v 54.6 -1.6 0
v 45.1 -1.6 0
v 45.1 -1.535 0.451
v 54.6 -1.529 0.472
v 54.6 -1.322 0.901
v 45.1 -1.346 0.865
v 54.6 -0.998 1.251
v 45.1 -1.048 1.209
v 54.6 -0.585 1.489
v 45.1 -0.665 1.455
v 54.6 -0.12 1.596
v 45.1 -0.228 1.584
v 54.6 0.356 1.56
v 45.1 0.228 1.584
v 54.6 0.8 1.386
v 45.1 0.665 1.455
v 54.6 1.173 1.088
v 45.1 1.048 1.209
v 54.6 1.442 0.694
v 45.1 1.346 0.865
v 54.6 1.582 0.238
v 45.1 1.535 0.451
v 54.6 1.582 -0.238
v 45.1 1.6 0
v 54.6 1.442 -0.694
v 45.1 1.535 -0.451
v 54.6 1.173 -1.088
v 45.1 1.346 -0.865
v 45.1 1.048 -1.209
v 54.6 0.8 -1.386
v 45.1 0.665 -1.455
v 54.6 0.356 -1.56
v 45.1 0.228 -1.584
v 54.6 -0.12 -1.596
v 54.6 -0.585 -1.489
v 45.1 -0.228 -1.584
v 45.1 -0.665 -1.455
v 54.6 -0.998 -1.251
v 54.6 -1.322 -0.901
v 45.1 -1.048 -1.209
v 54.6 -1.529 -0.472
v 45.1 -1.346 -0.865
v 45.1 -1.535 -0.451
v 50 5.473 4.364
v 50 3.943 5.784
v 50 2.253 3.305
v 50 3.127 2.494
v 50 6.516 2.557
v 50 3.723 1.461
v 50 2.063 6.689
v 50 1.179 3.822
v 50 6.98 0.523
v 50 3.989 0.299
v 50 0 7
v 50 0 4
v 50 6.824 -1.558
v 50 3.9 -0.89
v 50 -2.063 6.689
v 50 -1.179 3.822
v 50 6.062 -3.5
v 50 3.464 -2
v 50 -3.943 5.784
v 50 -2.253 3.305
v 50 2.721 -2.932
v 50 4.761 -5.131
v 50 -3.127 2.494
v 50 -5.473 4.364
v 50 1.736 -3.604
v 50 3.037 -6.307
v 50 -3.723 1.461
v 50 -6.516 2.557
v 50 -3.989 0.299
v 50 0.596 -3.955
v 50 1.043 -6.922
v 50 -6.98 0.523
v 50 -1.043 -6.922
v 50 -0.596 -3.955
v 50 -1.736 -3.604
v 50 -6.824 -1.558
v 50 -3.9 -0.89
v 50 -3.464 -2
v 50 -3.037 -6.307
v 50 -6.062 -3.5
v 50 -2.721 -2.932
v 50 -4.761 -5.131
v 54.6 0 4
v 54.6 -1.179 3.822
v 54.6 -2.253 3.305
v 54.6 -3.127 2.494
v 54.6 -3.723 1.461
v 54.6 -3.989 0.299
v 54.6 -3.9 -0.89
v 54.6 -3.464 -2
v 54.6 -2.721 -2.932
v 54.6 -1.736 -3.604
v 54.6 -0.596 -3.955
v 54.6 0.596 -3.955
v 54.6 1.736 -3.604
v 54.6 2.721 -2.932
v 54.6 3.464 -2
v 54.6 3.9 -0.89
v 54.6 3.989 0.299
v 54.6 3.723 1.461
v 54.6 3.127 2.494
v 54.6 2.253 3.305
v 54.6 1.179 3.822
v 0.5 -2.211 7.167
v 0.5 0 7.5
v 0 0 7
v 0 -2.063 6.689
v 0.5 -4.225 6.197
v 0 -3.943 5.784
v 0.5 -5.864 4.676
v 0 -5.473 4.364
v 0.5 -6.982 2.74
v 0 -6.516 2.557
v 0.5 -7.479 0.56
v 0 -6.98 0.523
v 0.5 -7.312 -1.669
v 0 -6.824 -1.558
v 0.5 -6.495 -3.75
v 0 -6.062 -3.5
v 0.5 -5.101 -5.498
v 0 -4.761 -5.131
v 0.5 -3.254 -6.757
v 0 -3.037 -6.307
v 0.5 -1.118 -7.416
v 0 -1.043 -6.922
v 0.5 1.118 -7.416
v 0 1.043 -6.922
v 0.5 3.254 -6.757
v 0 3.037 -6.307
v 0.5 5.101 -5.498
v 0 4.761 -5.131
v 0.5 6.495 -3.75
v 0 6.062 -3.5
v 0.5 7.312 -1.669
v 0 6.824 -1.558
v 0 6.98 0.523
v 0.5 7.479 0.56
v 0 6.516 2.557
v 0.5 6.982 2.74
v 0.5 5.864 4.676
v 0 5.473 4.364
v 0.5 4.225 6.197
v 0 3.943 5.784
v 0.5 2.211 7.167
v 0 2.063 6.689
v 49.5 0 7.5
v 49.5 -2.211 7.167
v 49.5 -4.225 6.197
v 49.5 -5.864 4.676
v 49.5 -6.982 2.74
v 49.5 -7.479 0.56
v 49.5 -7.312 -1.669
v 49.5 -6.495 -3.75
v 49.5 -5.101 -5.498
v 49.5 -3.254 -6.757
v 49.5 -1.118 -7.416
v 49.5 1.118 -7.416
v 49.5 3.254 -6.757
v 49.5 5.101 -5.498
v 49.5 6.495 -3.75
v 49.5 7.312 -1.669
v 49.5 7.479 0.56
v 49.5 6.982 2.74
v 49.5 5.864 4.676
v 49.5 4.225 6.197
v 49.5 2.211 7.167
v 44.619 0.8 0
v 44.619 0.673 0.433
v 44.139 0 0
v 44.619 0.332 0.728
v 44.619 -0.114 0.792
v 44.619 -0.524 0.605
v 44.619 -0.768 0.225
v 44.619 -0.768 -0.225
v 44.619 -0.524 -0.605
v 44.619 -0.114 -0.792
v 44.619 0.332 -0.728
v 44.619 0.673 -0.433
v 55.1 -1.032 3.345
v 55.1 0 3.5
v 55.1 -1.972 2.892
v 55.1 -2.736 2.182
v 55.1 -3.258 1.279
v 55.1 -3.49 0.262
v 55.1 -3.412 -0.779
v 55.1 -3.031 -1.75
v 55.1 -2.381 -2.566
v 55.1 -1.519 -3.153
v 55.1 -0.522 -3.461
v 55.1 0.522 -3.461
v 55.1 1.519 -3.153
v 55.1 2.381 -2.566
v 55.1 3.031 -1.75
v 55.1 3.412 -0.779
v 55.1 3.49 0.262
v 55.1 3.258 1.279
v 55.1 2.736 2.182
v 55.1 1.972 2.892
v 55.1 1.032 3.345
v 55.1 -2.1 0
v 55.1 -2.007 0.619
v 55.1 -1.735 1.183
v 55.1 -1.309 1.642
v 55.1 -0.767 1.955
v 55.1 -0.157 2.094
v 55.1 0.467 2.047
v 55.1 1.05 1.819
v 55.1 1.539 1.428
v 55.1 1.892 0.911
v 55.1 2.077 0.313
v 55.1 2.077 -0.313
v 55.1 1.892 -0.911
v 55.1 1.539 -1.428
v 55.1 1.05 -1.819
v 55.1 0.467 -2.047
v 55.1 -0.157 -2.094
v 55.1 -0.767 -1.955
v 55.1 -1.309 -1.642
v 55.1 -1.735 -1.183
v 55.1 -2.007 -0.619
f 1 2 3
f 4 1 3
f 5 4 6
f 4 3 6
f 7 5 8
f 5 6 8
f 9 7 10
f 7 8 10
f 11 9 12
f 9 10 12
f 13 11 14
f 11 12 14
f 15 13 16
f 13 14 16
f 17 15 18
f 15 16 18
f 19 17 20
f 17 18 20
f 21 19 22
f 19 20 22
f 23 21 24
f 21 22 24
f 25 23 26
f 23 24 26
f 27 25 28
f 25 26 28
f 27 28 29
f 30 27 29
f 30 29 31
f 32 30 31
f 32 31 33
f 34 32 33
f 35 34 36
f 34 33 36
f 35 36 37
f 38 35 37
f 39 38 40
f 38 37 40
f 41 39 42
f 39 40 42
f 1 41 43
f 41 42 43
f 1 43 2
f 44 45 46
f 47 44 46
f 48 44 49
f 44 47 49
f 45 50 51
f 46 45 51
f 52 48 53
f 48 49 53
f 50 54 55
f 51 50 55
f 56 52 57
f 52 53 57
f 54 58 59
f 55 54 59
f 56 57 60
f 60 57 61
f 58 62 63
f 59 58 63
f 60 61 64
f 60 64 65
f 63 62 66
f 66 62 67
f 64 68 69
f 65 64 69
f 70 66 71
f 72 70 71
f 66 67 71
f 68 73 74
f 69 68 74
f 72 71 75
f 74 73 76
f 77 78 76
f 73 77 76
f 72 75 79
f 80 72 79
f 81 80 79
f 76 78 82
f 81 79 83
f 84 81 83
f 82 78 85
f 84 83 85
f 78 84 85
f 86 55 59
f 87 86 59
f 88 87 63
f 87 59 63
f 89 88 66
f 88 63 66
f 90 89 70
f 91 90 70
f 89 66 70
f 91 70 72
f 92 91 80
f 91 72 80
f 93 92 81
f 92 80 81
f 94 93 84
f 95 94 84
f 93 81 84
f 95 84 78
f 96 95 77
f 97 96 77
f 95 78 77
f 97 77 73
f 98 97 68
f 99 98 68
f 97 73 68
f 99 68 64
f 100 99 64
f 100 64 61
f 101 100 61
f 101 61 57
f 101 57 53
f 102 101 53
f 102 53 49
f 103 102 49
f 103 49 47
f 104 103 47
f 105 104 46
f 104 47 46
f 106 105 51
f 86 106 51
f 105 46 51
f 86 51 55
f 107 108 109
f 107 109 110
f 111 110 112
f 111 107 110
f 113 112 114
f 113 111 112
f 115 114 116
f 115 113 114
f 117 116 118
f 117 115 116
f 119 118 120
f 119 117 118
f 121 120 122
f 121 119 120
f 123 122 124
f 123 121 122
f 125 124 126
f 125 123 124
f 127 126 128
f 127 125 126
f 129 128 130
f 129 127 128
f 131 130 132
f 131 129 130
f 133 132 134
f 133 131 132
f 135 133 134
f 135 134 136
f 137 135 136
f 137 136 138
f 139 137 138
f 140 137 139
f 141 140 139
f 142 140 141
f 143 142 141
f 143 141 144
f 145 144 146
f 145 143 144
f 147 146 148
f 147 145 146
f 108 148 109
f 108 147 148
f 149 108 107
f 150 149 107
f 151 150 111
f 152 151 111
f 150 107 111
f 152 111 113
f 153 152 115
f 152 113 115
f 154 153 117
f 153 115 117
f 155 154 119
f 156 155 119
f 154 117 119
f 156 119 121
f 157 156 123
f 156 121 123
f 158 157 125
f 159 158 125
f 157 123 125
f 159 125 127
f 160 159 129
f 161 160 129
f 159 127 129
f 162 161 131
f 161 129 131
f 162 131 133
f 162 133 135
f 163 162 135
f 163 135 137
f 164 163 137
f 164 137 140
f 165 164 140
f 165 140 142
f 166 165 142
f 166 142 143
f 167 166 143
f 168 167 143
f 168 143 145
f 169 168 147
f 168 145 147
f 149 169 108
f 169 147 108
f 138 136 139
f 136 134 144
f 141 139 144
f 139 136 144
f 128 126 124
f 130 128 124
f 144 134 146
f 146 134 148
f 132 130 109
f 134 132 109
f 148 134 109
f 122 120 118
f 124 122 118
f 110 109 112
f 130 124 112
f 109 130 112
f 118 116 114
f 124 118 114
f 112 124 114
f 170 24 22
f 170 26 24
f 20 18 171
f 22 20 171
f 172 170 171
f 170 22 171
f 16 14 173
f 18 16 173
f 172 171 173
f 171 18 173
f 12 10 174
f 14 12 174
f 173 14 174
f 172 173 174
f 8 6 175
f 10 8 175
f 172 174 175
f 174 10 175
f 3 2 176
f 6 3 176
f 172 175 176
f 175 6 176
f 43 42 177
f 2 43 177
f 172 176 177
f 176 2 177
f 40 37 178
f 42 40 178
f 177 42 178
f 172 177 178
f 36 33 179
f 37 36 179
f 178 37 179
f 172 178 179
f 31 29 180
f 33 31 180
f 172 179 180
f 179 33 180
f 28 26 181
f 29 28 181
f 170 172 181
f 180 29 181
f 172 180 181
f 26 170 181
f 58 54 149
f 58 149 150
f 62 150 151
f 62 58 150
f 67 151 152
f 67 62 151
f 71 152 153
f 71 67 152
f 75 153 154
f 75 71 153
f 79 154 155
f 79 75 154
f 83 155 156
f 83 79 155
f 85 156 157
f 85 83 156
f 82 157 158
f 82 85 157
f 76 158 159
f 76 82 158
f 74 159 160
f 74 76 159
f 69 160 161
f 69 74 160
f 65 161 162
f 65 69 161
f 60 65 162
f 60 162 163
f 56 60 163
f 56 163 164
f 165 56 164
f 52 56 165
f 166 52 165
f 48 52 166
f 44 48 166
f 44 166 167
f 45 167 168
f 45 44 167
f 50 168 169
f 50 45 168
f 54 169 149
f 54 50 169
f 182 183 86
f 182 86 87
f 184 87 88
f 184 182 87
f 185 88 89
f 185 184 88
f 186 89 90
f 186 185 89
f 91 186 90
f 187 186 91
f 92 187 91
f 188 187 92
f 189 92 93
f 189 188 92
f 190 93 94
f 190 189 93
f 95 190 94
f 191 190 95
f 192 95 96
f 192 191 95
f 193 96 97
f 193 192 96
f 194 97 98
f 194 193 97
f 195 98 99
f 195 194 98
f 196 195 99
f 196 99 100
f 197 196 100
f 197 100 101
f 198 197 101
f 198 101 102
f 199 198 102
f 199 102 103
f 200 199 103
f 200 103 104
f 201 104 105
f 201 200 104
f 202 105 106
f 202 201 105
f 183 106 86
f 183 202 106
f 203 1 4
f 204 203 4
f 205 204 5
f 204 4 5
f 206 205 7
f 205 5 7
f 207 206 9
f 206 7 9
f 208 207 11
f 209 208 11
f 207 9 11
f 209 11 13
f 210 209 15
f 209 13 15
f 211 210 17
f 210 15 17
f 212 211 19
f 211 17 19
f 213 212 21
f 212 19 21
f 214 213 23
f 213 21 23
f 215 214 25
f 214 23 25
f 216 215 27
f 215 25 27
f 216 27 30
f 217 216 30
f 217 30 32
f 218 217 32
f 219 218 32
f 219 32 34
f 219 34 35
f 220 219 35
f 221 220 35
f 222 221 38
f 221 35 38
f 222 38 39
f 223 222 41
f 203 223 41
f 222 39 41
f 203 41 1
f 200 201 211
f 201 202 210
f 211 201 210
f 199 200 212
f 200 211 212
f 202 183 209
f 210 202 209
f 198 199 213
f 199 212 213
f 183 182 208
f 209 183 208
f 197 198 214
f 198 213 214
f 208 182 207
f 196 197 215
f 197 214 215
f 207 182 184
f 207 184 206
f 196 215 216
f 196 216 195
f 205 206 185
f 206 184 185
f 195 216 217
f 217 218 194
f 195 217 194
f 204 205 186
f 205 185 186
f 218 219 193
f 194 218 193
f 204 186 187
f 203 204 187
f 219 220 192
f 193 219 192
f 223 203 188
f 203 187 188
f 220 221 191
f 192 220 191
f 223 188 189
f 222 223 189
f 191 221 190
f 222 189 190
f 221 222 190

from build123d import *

# Parameters (mm, degrees)
F3_D     = 3.2
F3_DEPTH = 10
F3_TIP   = 0.9613769904
F4_SIZE  = 0.5


with BuildPart() as f1:
    # F0 (on Front) → F1 (revolve)
    with BuildSketch(Plane.XZ):
        Polygon((0, 7.5), (0, 0), (50, 0), (55.1, 0), (55.1, 4), (50, 4), (50, 7.5), align=None)
    revolve(axis=Axis((25, 0, 0), (1, 0, 0)))

    # F3
    with Locations(Plane.YZ.offset(55.1)):
        with Locations((0, 0)):
            Hole(F3_D / 2, depth=F3_DEPTH)
            with Locations((0, 0, -(F3_DEPTH + F3_TIP / 2))):  # 118° drill point
                Cone(0, F3_D / 2, F3_TIP, mode=Mode.SUBTRACT)

    # F4
    f4_edges = [f1.edges().sort_by_distance(p)[0] for p in [
        (50, 0, -7.5),
        (0, 0, -7.5),
        (25, 0, 7.5),
        (55.1, 0, -4),
        (55.1, -1.6, 0),
    ]]
    chamfer(f4_edges, length=F4_SIZE)


solid = f1.part
